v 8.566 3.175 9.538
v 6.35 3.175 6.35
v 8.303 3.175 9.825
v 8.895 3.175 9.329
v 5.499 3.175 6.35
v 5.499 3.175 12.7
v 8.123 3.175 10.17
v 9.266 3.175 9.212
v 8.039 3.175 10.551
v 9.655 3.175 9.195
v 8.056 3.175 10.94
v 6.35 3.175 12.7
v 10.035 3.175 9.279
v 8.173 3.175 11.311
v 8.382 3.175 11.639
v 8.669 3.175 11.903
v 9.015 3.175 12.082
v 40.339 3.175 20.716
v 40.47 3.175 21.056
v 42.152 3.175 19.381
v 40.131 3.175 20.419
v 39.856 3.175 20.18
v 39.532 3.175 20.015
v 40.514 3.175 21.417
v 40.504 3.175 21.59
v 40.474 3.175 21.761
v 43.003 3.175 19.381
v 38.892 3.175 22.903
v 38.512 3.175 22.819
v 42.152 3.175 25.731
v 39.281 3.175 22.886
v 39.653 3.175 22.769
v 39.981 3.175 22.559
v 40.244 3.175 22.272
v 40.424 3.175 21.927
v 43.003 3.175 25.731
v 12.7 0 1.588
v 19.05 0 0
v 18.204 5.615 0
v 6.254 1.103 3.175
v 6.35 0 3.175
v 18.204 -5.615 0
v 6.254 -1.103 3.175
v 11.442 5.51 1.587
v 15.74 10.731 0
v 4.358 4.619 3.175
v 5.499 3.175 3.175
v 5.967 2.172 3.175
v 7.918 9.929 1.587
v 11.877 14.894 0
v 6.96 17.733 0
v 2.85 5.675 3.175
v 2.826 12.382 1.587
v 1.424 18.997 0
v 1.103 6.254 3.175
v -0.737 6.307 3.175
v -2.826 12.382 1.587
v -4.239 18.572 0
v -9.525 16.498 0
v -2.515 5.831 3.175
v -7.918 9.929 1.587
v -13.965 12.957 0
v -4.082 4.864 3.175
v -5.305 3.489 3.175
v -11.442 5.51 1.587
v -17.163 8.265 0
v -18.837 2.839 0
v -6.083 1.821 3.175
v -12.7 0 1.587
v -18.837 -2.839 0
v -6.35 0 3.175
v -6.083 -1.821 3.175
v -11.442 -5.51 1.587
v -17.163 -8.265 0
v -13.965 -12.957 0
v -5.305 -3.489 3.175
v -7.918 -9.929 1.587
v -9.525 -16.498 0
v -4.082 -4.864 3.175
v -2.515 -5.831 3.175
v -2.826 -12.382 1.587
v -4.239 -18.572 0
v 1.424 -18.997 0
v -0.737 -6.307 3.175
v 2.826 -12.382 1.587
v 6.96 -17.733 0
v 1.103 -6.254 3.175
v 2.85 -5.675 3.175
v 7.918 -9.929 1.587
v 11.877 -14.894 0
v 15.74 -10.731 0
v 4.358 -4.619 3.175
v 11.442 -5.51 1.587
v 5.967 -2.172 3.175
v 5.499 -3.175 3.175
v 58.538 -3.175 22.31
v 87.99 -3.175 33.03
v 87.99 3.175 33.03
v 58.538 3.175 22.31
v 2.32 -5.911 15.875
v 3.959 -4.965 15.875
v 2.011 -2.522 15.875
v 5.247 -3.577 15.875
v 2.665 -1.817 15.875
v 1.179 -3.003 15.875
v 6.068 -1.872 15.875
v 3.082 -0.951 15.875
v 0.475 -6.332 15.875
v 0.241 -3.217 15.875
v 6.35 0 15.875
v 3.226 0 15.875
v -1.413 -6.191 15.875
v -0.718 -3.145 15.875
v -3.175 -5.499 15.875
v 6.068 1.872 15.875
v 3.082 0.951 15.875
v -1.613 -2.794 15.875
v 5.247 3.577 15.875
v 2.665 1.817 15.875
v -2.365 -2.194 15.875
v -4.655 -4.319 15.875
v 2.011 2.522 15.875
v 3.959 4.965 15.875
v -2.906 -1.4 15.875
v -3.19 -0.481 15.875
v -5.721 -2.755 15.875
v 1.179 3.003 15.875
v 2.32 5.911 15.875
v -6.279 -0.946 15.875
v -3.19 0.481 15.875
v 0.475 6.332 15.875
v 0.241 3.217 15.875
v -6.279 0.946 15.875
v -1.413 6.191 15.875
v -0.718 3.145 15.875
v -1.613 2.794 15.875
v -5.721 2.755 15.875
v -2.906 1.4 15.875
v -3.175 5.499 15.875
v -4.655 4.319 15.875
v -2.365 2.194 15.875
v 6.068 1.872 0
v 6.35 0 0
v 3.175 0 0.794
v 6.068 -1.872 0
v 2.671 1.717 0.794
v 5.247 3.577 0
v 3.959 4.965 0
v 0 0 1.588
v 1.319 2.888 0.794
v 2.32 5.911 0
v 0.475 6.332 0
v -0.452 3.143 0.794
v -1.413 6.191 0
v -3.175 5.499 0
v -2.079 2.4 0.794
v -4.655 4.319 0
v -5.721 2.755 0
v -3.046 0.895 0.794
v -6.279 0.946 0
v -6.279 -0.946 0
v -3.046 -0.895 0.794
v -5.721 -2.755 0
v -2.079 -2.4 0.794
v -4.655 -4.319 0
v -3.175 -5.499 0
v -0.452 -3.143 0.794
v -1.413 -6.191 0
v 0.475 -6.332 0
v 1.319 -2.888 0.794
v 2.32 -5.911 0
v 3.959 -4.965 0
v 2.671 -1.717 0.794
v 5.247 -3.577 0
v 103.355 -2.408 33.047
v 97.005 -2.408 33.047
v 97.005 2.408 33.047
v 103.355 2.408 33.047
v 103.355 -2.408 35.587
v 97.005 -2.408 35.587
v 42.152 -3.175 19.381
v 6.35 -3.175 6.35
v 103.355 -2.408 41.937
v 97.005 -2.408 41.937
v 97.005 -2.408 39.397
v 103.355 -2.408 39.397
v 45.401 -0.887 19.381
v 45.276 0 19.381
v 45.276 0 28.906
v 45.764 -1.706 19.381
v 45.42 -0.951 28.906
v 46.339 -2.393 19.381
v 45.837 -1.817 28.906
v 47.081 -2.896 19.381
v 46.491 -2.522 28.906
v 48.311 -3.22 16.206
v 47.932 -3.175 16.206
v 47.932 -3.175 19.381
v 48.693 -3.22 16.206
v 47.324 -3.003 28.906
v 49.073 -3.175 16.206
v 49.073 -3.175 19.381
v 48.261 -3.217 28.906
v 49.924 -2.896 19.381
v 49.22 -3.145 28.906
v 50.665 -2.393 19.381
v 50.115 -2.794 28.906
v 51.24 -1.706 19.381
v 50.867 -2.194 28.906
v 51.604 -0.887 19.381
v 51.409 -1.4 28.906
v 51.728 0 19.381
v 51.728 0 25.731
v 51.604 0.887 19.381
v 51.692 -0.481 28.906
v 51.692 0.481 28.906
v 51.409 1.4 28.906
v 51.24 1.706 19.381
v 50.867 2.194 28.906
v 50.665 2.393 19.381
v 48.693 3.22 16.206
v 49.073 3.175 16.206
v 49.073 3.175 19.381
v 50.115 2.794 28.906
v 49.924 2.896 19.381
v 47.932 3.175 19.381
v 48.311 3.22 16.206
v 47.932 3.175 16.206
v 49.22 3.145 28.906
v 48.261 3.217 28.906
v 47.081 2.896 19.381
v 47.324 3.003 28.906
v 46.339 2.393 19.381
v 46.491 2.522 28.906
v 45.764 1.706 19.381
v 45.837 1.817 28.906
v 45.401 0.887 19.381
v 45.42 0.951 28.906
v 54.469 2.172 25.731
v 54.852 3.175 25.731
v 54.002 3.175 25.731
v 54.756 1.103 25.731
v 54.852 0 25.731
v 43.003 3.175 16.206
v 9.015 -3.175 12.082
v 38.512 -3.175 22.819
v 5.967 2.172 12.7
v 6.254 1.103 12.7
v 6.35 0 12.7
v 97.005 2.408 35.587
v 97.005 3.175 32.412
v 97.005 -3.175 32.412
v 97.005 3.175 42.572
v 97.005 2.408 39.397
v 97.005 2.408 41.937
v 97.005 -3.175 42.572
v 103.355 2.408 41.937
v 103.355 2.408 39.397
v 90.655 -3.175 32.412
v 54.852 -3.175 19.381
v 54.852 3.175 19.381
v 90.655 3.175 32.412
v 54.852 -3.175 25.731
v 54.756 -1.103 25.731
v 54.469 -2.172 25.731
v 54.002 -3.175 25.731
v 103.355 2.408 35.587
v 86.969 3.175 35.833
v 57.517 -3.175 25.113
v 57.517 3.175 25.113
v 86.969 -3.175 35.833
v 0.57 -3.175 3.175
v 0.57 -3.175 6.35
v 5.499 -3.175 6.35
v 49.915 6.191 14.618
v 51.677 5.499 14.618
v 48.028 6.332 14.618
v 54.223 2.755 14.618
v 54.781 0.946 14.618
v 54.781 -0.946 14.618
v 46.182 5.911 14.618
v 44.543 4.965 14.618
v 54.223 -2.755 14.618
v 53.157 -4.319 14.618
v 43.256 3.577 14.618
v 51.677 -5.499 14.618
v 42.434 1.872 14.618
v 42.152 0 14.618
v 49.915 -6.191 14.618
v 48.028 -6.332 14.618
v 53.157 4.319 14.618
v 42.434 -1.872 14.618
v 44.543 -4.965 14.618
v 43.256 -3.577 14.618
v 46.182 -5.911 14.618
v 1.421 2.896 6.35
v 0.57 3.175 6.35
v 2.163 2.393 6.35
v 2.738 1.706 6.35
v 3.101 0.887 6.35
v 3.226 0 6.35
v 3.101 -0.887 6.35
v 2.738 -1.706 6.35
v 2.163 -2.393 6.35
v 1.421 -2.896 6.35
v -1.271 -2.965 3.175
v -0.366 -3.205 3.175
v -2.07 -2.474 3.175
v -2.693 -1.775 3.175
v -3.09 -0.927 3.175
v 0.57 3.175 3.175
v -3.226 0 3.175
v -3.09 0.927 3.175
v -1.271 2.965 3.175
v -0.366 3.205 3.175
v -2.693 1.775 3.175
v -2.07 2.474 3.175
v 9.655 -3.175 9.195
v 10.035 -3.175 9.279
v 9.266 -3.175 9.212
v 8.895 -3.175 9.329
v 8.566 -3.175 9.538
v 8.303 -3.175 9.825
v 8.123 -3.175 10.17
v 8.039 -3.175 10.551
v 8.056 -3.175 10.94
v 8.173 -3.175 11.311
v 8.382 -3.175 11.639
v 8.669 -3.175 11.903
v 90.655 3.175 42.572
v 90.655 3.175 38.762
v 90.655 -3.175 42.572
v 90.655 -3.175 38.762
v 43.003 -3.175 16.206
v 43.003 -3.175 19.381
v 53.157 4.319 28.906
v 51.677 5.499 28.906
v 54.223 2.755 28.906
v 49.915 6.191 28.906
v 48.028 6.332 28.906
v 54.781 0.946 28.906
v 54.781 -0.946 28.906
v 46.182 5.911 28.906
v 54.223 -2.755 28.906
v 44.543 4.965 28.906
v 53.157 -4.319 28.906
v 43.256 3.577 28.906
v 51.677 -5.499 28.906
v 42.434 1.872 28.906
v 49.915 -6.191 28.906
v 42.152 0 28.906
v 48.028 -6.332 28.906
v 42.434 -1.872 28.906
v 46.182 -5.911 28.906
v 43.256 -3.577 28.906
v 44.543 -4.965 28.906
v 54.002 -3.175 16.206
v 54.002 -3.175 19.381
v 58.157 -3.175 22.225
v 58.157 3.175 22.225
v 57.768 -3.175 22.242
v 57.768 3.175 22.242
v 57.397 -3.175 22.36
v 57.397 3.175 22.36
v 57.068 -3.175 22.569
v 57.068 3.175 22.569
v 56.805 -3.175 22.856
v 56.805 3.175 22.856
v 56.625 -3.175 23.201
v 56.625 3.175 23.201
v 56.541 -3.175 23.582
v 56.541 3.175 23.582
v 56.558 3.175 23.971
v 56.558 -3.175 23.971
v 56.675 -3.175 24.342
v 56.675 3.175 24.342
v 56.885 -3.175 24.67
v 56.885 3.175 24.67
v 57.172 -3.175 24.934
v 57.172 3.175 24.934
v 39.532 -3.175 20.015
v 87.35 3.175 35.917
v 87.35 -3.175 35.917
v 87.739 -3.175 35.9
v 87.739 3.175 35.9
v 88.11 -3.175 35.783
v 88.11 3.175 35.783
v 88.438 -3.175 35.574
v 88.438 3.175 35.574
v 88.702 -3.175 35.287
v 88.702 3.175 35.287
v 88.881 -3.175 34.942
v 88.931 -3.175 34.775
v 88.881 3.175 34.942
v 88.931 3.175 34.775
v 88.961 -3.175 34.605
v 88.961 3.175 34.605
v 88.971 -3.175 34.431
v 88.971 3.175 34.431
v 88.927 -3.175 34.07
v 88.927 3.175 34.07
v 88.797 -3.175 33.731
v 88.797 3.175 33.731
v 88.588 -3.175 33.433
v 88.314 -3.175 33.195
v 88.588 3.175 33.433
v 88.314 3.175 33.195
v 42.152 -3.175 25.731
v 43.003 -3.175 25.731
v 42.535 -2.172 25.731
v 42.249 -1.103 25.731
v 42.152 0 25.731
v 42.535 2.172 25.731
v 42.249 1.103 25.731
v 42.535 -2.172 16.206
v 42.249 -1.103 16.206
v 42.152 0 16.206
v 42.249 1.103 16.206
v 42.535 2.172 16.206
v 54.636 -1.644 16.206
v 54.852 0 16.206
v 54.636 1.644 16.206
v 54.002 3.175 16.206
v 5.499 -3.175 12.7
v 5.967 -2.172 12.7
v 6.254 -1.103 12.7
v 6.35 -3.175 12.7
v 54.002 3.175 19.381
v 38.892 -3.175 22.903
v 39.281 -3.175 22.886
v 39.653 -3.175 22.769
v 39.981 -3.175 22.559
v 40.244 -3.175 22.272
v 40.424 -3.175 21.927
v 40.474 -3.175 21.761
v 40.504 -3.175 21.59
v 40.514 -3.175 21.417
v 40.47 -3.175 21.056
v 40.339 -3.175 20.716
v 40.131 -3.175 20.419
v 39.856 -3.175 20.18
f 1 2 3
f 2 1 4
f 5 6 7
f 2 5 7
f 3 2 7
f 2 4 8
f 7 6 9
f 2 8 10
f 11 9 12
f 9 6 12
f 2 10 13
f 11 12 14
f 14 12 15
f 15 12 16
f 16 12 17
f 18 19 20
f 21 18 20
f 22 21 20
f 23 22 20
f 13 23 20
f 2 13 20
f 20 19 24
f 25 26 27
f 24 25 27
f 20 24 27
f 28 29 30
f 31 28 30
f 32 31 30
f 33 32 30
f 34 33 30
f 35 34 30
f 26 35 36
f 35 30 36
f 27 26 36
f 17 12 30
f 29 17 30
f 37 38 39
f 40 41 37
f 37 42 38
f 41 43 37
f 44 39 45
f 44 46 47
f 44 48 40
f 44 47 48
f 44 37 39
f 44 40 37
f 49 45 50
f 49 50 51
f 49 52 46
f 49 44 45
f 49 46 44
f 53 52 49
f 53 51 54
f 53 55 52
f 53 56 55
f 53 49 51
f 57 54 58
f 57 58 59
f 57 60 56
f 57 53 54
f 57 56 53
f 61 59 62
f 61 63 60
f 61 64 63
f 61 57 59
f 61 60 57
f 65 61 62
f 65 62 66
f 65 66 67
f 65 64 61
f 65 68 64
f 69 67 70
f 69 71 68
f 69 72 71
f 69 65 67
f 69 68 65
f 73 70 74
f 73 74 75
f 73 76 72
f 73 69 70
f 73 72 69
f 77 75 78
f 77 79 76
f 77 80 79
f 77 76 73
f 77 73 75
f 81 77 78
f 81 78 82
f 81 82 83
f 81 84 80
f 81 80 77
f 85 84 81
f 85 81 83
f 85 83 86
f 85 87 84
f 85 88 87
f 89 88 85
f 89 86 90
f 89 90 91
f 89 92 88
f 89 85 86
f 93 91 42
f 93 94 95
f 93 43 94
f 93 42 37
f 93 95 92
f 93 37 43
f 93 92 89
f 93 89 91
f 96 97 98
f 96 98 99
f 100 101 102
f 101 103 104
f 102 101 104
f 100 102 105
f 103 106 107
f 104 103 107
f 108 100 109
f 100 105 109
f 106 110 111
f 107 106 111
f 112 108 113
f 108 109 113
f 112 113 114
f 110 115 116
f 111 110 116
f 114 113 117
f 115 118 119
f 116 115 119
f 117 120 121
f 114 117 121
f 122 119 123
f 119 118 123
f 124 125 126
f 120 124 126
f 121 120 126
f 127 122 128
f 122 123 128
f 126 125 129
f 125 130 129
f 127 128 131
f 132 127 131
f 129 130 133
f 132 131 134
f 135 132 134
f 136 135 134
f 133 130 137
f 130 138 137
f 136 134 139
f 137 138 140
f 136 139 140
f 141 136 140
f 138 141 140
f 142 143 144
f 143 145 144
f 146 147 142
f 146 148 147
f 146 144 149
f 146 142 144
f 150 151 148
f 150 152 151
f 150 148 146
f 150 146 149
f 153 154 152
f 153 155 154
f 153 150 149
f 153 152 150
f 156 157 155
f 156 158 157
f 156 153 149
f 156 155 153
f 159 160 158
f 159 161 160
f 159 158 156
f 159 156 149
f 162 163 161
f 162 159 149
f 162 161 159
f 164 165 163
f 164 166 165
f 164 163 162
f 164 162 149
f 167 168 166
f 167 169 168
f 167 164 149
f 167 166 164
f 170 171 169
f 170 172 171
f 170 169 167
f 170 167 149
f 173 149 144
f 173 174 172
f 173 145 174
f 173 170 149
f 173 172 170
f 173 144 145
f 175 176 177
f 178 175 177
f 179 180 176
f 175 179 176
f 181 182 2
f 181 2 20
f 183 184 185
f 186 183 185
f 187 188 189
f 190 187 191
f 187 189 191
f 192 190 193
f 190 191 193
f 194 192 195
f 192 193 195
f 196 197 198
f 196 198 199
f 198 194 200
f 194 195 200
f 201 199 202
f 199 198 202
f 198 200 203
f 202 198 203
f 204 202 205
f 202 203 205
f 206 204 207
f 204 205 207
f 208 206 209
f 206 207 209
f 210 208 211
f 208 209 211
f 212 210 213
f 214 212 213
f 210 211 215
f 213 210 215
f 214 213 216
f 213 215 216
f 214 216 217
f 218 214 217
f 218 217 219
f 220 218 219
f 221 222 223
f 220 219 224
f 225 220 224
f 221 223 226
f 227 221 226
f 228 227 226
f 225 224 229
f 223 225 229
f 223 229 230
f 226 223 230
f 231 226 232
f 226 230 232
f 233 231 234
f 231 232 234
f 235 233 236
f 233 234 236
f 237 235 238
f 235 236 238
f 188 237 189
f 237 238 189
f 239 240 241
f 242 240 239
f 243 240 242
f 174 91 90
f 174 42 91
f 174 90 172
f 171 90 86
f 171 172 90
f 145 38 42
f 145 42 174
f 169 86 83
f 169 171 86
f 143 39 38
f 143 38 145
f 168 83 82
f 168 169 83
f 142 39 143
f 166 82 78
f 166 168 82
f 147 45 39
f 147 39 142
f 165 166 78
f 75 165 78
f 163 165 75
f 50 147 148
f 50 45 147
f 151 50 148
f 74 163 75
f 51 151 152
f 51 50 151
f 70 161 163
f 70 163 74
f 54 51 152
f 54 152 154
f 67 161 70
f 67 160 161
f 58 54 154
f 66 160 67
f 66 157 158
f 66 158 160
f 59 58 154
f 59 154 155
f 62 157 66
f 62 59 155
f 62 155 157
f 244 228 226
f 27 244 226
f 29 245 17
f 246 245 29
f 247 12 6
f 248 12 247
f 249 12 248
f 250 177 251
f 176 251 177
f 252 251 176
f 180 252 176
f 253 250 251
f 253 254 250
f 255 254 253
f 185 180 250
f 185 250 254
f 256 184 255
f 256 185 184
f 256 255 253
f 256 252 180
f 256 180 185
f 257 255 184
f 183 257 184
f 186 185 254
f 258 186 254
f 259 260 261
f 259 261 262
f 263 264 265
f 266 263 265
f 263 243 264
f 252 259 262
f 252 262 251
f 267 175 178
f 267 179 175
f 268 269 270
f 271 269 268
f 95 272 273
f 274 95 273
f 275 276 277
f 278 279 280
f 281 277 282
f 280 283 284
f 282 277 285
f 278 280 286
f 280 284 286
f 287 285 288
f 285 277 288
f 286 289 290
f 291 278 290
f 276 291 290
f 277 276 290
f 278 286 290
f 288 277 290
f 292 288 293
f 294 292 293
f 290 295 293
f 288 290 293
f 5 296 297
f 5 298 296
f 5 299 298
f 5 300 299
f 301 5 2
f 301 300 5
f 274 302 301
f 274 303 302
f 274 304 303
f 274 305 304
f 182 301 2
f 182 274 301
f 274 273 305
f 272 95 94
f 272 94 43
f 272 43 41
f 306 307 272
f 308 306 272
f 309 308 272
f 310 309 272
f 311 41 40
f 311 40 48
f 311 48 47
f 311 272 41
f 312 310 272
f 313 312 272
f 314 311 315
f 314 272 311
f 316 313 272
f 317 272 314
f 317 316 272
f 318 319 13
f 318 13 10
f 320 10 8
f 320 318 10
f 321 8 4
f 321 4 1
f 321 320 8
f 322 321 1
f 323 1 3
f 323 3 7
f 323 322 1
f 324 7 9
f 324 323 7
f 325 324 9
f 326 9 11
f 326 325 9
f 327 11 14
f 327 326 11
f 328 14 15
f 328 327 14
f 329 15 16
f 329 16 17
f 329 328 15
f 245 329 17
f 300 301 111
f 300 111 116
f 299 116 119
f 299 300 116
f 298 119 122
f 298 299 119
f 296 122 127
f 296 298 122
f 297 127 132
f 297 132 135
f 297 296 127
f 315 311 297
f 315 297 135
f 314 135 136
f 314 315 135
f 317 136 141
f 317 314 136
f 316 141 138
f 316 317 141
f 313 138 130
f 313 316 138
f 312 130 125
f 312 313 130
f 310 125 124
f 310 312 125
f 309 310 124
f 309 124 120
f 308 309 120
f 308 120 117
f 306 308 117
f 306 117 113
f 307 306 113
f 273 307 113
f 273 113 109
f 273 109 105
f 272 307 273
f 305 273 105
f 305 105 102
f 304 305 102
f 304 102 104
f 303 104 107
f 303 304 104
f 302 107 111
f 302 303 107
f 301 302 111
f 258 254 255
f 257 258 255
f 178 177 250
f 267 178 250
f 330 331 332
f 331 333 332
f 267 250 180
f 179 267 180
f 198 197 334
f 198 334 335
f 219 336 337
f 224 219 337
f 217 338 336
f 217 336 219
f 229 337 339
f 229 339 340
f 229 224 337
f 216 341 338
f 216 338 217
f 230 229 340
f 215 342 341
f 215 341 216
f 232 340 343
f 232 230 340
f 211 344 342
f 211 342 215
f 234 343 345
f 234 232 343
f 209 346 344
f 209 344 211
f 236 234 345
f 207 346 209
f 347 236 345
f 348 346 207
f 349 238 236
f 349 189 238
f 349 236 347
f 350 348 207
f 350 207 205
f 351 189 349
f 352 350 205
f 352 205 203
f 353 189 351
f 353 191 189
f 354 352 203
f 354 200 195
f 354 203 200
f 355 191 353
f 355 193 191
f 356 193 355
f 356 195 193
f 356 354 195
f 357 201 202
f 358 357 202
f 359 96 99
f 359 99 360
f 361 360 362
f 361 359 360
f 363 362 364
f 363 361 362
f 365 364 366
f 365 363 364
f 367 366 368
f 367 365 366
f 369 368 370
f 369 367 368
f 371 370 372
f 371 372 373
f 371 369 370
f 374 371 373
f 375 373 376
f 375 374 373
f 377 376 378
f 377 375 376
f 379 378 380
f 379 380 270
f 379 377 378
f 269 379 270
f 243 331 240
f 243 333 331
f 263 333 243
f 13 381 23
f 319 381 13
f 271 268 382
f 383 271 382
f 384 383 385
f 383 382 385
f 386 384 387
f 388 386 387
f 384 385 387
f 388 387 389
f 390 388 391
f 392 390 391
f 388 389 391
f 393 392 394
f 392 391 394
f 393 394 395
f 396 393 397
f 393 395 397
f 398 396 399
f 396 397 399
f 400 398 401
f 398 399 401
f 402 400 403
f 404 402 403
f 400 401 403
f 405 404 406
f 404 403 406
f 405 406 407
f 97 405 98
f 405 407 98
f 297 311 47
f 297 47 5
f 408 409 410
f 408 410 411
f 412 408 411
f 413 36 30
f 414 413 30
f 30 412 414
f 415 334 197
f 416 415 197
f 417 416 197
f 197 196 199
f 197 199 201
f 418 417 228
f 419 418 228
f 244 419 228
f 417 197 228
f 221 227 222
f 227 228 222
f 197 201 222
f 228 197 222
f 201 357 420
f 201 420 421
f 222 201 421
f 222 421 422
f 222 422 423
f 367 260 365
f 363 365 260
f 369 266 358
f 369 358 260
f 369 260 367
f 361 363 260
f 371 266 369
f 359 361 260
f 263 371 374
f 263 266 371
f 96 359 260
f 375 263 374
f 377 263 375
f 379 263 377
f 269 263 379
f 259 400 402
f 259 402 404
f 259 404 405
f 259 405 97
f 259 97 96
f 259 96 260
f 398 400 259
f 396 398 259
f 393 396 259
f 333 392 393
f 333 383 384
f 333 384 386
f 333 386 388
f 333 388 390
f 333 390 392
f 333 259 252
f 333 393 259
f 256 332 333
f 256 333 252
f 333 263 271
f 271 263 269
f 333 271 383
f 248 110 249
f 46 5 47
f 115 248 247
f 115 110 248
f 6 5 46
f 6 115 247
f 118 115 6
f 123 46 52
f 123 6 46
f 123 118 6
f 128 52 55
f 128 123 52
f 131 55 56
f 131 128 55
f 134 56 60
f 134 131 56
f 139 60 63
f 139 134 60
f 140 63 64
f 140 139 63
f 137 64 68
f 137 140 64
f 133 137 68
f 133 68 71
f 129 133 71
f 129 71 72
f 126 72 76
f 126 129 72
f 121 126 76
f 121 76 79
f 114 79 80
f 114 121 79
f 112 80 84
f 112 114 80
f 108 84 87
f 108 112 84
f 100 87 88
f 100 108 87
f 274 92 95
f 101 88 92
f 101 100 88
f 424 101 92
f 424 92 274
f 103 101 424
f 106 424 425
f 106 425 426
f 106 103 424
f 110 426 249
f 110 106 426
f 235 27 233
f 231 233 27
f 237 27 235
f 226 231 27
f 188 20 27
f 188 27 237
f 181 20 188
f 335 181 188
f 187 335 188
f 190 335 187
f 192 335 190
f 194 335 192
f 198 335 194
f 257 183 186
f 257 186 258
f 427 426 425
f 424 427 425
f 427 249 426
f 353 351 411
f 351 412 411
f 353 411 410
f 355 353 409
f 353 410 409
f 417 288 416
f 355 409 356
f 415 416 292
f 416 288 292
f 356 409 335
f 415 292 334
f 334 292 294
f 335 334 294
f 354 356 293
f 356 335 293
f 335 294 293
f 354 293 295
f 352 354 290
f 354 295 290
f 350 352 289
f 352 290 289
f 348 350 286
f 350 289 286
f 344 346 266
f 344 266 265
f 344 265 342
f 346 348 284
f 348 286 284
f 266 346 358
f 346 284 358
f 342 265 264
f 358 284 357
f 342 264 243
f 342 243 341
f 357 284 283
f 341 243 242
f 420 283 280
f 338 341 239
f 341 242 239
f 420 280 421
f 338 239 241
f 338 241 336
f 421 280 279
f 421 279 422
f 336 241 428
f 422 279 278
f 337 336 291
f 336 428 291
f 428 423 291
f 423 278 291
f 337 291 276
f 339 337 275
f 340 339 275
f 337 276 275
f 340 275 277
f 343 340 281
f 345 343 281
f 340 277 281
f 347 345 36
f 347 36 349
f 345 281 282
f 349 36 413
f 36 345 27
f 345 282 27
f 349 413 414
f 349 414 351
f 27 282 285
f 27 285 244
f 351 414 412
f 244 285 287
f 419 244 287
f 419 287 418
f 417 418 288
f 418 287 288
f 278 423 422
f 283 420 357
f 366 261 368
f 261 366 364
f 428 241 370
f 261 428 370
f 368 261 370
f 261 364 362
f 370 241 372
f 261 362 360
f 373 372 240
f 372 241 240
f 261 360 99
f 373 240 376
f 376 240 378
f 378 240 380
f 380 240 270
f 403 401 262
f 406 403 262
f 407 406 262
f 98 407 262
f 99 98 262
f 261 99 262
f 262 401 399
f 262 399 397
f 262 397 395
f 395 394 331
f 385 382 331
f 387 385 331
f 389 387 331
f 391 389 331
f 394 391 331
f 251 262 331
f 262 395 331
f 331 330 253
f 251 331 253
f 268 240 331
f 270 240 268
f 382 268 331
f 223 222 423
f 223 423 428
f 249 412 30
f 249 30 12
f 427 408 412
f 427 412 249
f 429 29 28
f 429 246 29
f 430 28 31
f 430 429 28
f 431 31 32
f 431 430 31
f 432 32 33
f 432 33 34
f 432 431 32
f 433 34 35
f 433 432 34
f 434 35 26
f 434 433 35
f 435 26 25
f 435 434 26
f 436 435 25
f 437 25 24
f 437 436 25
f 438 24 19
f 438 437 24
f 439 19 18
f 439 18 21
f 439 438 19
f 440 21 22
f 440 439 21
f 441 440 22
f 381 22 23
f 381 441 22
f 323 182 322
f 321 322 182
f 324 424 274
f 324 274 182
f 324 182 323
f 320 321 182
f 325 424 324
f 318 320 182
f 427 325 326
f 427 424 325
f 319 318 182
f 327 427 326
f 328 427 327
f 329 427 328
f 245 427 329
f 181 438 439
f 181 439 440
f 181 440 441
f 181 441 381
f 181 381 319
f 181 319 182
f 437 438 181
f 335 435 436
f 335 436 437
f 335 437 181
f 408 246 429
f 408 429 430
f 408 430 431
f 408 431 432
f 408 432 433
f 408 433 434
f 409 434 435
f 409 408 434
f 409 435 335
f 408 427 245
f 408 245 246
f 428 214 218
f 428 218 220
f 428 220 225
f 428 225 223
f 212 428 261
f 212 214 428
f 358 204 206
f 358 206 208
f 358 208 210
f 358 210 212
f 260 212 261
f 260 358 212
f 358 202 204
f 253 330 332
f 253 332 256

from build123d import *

# Parameters (mm, degrees)
F0_W     = 3.1242
F0_H     = 3.175
F2_DEPTH = 3.175
F0_W_2   = 0.254
F0_W_3   = 6.35
F0_H_2   = 3.81
F4_W     = 3.175
F4_H     = 3.175
F5_DEPTH = 6.35
F6_W     = 6.35
F6_H     = 3.175
F7_DEPTH = 12.954
F9_DEPTH = 6.35


with BuildPart() as f1:
    # F0 (on Front) → F1 (revolve)
    with BuildSketch(Plane.XZ):
        Polygon((3.2258, 3.175), (0, 3.175), (0, 1.5875), (6.35, 0), (19.05, 0), (6.35, 3.175), (6.35, 6.35), (3.2258, 6.35), align=None)
        Polygon((3.2258, 9.525), (3.2258, 6.35), (6.35, 6.35), (6.35, 7.9375), (6.35, 9.525), align=None)
        Polygon((3.2258, 12.7), (3.2258, 9.525), (6.35, 9.525), (6.35, 11.1125), (6.35, 12.7), align=None)
        with Locations((4.7879, 14.2875)):
            Rectangle(F0_W, F0_H)
    revolve(axis=Axis((0, 0, 9.525), (0, 0, 1)))

    # F0 (on Front) → F2 (join, symmetric)
    with BuildSketch(Plane.XZ):
        Polygon((6.35, 7.9375), (6.35, 6.35), (42.1522888519, 19.3809674607), (42.1522888519, 20.9684674607), (39.5324932131, 20.0149398283), (10.0352127619, 9.2788077523), align=None)
        with BuildLine():
            Line((8.1232022233, 10.1703928286), (6.35, 9.525))
            Line((6.35, 9.525), (6.35, 7.9375))
            Line((6.35, 7.9375), (10.0352127619, 9.2788077523))
            ThreePointArc((10.0352127619, 9.2788077523), (8.8945541682, 9.3286099229), (8.1232022233, 10.1703928286))
        make_face()
        with BuildLine():
            Line((6.35, 11.1125), (6.35, 9.525))
            Line((6.35, 9.525), (8.1232022233, 10.1703928286))
            ThreePointArc((8.1232022233, 10.1703928286), (8.173004472, 11.3110514176), (9.014787429, 12.0824033048))
            Line((9.014787429, 12.0824033048), (6.35, 11.1125))
        make_face()
        Polygon((42.1522888519, 25.7309674607), (6.35, 12.7), (6.35, 11.1125), (9.014787429, 12.0824033048), (38.5120679189, 22.8185353949), (42.1522888519, 24.1434674607), align=None)
        Polygon((3.2258, 12.7), (3.2258, 9.525), (6.35, 9.525), (6.35, 11.1125), (6.35, 12.7), align=None)
        Polygon((3.2258, 9.525), (3.2258, 6.35), (6.35, 6.35), (6.35, 7.9375), (6.35, 9.525), align=None)
        with BuildLine():
            Line((42.1015425762, 22.5374973268), (42.1522888519, 22.5377925414))
            Line((42.1522888519, 22.5377925414), (42.1522888519, 24.1434674607))
            Line((42.1522888519, 24.1434674607), (38.5120679189, 22.8185353949))
            ThreePointArc((38.5120679189, 22.8185353949), (39.65272644, 22.7687331418), (40.4240783174, 21.9269502676))
            Line((40.4240783174, 21.9269502676), (40.5140425762, 21.9596945799))
            Line((40.5140425762, 21.9596945799), (42.1015425762, 22.5374973268))
        make_face()
        with BuildLine():
            Line((39.5324932131, 20.0149398283), (42.1522888519, 20.9684674607))
            Line((42.1522888519, 20.9684674607), (42.1522888519, 22.5377925414))
            Line((42.1522888519, 22.5377925414), (42.1015425762, 22.5374973268))
            Line((42.1015425762, 22.5374973268), (40.5140425762, 21.9596945799))
            Line((40.5140425762, 21.9596945799), (40.4240783174, 21.9269502676))
            ThreePointArc((40.4240783174, 21.9269502676), (40.4913793589, 21.6757793614), (40.5140425762, 21.4167376024))
            ThreePointArc((40.5140425762, 21.4167376024), (40.2442604638, 20.5610980533), (39.5324932131, 20.0149398283))
        make_face()
        Polygon((45.2764888519, 25.7309674607), (42.1522888519, 25.7309674607), (42.1522888519, 24.1434674607), (42.1522888519, 22.5377925414), (45.2764888519, 22.5559674607), align=None)
        Polygon((42.1522888519, 20.9684674607), (42.1522888519, 19.3809674607), (45.2764888519, 19.3809674607), (45.2764888519, 22.5559674607), (42.1522888519, 22.5377925414), align=None)
    extrude(amount=F2_DEPTH, both=True)



with BuildPart() as f2:
    # F0 (on Front) → F2, piece 2 (new body, symmetric)
    with BuildSketch(Plane.XZ):
        with Locations((54.9792888519, 17.7934674607)):
            Rectangle(F0_W_2, F0_H)
    extrude(amount=F2_DEPTH, both=True)

    # F0 (on Front) → F2, piece 3 (join, symmetric)
    with BuildSketch(Plane.XZ):
        Polygon((51.7280888519, 22.5559674607), (51.7280888519, 19.3809674607), (54.8522888519, 19.3809674607), (54.8522888519, 20.9684674607), (54.8522888519, 22.5559674607), align=None)
        Polygon((51.7280888519, 25.7309674607), (51.7280888519, 22.5559674607), (54.8522888519, 22.5559674607), (54.8522888519, 24.1434674607), (54.8522888519, 25.7309674607), align=None)
        Polygon((90.6545777039, 38.7619349214), (54.8522888519, 25.7309674607), (54.8522888519, 24.1434674607), (57.5170761795, 25.1133707286), (86.9693651328, 35.8331272386), (90.6545777039, 37.1744349214), align=None)
        with BuildLine():
            Line((54.8522888519, 24.1434674607), (54.8522888519, 22.5559674607))
            Line((54.8522888519, 22.5559674607), (56.6254910752, 23.2013602893))
            ThreePointArc((56.6254910752, 23.2013602893), (56.6752933011, 24.3420188294), (57.5170761795, 25.1133707286))
            Line((57.5170761795, 25.1133707286), (54.8522888519, 24.1434674607))
        make_face()
        with BuildLine():
            Line((54.8522888519, 22.5559674607), (54.8522888519, 20.9684674607))
            Line((54.8522888519, 20.9684674607), (58.5375015244, 22.3097751804))
            ThreePointArc((58.5375015244, 22.3097751804), (57.3968429771, 22.3595774037), (56.6254910752, 23.2013602893))
            Line((56.6254910752, 23.2013602893), (54.8522888519, 22.5559674607))
        make_face()
        Polygon((54.8522888519, 20.9684674607), (54.8522888519, 19.3809674607), (90.6545777039, 32.4119349214), (90.6545777039, 33.9994349214), (87.9897903763, 33.0295316535), (58.5375015244, 22.3097751804), align=None)
        with BuildLine():
            Line((87.9897903763, 33.0295316535), (90.6545777039, 33.9994349214))
            Line((90.6545777039, 33.9994349214), (90.6545777039, 35.5869349214))
            Line((90.6545777039, 35.5869349214), (88.8813754806, 34.9415420928))
            ThreePointArc((88.8813754806, 34.9415420928), (88.9486765221, 34.6903711866), (88.9713397394, 34.4313294276))
            ThreePointArc((88.9713397394, 34.4313294276), (88.7015576271, 33.5756898786), (87.9897903763, 33.0295316535))
        make_face()
        with BuildLine():
            Line((88.8813754806, 34.9415420928), (90.6545777039, 35.5869349214))
            Line((90.6545777039, 35.5869349214), (90.6545777039, 37.1744349214))
            Line((90.6545777039, 37.1744349214), (86.9693651328, 35.8331272386))
            ThreePointArc((86.9693651328, 35.8331272386), (88.1100236277, 35.7833249556), (88.8813754806, 34.9415420928))
        make_face()
        Polygon((90.6545777039, 33.9994349214), (90.6545777039, 32.4119349214), (97.0045777039, 32.4119349214), (97.0045777039, 38.7619349214), (90.6545777039, 38.7619349214), (90.6545777039, 37.1744349214), (90.6545777039, 35.5869349214), align=None)
        with Locations((93.8295777039, 40.6669349214)):
            Rectangle(F0_W_3, F0_H_2)
    extrude(amount=F2_DEPTH, both=True)


with BuildPart() as f1_1:
    add(f1.part)

    add(f2.part)  # F3 merges F2
    # F0 (on Front) → F3 (revolve)
    with BuildSketch(Plane.XZ):
        Polygon((45.2764888519, 16.2059674607), (42.1522888519, 16.2059674607), (42.1522888519, 14.6184674607), (48.5022888519, 14.6184674607), (48.5022888519, 16.2059674607), align=None)
        with Locations((43.7143888519, 17.7934674607)):
            Rectangle(F0_W, F0_H)
        Polygon((42.1522888519, 20.9684674607), (42.1522888519, 19.3809674607), (45.2764888519, 19.3809674607), (45.2764888519, 22.5559674607), (42.1522888519, 22.5377925414), align=None)
        Polygon((45.2764888519, 25.7309674607), (42.1522888519, 25.7309674607), (42.1522888519, 24.1434674607), (42.1522888519, 22.5377925414), (45.2764888519, 22.5559674607), align=None)
        with Locations((43.7143888519, 27.3184674607)):
            Rectangle(F0_W, F0_H)
    revolve(axis=Axis((48.5022888519, 0, 22.5559674607), (0, 0, 1)))

    # F4 (on Right) → F5 (cut)
    with BuildSketch(Plane.YZ):
        with Locations((-1.5875, 4.7625)):
            Rectangle(F4_W, F4_H)
        with Locations((1.5875, 4.7625)):
            Rectangle(F4_W, F4_H)
    extrude(amount=F5_DEPTH, mode=Mode.SUBTRACT)

    # F6 (on face) → F7 (cut)
    with BuildSketch(Plane.YZ.offset(55.1062888519)):
        with Locations((0, 17.7934674607)):
            Rectangle(F6_W, F6_H)
    extrude(amount=-F7_DEPTH, mode=Mode.SUBTRACT)

    # F8 (on face) → F9 (join)
    with BuildSketch(Plane.YZ.offset(97.0045777039)):
        Polygon((0, 41.9369349214), (-2.4077083333, 41.9369349214), (0, 40.6669349214), align=None)
        Polygon((2.4077083333, 41.9369349214), (0, 41.9369349214), (0, 40.6669349214), align=None)
        Polygon((0, 33.0469349214), (0, 34.3169349214), (-2.4077083333, 33.0469349214), align=None)
        Polygon((2.4077083333, 33.0469349214), (0, 34.3169349214), (0, 33.0469349214), align=None)
        Polygon((2.4077083333, 33.0469349214), (2.4077083333, 35.5869349214), (0, 34.3169349214), align=None)
        Polygon((2.4077083333, 35.5869349214), (0, 35.5869349214), (0, 34.3169349214), align=None)
        Polygon((0, 34.3169349214), (0, 35.5869349214), (-2.4077083333, 35.5869349214), align=None)
        Polygon((0, 34.3169349214), (-2.4077083333, 35.5869349214), (-2.4077083333, 33.0469349214), align=None)
        Polygon((0, 40.6669349214), (-2.4077083333, 39.3969349214), (0, 39.3969349214), align=None)
        Polygon((0, 40.6669349214), (-2.4077083333, 41.9369349214), (-2.4077083333, 39.3969349214), align=None)
        Polygon((2.4077083333, 39.3969349214), (0, 40.6669349214), (0, 39.3969349214), align=None)
        Polygon((2.4077083333, 41.9369349214), (0, 40.6669349214), (2.4077083333, 39.3969349214), align=None)
    extrude(amount=F9_DEPTH)


solid = f1_1.part
